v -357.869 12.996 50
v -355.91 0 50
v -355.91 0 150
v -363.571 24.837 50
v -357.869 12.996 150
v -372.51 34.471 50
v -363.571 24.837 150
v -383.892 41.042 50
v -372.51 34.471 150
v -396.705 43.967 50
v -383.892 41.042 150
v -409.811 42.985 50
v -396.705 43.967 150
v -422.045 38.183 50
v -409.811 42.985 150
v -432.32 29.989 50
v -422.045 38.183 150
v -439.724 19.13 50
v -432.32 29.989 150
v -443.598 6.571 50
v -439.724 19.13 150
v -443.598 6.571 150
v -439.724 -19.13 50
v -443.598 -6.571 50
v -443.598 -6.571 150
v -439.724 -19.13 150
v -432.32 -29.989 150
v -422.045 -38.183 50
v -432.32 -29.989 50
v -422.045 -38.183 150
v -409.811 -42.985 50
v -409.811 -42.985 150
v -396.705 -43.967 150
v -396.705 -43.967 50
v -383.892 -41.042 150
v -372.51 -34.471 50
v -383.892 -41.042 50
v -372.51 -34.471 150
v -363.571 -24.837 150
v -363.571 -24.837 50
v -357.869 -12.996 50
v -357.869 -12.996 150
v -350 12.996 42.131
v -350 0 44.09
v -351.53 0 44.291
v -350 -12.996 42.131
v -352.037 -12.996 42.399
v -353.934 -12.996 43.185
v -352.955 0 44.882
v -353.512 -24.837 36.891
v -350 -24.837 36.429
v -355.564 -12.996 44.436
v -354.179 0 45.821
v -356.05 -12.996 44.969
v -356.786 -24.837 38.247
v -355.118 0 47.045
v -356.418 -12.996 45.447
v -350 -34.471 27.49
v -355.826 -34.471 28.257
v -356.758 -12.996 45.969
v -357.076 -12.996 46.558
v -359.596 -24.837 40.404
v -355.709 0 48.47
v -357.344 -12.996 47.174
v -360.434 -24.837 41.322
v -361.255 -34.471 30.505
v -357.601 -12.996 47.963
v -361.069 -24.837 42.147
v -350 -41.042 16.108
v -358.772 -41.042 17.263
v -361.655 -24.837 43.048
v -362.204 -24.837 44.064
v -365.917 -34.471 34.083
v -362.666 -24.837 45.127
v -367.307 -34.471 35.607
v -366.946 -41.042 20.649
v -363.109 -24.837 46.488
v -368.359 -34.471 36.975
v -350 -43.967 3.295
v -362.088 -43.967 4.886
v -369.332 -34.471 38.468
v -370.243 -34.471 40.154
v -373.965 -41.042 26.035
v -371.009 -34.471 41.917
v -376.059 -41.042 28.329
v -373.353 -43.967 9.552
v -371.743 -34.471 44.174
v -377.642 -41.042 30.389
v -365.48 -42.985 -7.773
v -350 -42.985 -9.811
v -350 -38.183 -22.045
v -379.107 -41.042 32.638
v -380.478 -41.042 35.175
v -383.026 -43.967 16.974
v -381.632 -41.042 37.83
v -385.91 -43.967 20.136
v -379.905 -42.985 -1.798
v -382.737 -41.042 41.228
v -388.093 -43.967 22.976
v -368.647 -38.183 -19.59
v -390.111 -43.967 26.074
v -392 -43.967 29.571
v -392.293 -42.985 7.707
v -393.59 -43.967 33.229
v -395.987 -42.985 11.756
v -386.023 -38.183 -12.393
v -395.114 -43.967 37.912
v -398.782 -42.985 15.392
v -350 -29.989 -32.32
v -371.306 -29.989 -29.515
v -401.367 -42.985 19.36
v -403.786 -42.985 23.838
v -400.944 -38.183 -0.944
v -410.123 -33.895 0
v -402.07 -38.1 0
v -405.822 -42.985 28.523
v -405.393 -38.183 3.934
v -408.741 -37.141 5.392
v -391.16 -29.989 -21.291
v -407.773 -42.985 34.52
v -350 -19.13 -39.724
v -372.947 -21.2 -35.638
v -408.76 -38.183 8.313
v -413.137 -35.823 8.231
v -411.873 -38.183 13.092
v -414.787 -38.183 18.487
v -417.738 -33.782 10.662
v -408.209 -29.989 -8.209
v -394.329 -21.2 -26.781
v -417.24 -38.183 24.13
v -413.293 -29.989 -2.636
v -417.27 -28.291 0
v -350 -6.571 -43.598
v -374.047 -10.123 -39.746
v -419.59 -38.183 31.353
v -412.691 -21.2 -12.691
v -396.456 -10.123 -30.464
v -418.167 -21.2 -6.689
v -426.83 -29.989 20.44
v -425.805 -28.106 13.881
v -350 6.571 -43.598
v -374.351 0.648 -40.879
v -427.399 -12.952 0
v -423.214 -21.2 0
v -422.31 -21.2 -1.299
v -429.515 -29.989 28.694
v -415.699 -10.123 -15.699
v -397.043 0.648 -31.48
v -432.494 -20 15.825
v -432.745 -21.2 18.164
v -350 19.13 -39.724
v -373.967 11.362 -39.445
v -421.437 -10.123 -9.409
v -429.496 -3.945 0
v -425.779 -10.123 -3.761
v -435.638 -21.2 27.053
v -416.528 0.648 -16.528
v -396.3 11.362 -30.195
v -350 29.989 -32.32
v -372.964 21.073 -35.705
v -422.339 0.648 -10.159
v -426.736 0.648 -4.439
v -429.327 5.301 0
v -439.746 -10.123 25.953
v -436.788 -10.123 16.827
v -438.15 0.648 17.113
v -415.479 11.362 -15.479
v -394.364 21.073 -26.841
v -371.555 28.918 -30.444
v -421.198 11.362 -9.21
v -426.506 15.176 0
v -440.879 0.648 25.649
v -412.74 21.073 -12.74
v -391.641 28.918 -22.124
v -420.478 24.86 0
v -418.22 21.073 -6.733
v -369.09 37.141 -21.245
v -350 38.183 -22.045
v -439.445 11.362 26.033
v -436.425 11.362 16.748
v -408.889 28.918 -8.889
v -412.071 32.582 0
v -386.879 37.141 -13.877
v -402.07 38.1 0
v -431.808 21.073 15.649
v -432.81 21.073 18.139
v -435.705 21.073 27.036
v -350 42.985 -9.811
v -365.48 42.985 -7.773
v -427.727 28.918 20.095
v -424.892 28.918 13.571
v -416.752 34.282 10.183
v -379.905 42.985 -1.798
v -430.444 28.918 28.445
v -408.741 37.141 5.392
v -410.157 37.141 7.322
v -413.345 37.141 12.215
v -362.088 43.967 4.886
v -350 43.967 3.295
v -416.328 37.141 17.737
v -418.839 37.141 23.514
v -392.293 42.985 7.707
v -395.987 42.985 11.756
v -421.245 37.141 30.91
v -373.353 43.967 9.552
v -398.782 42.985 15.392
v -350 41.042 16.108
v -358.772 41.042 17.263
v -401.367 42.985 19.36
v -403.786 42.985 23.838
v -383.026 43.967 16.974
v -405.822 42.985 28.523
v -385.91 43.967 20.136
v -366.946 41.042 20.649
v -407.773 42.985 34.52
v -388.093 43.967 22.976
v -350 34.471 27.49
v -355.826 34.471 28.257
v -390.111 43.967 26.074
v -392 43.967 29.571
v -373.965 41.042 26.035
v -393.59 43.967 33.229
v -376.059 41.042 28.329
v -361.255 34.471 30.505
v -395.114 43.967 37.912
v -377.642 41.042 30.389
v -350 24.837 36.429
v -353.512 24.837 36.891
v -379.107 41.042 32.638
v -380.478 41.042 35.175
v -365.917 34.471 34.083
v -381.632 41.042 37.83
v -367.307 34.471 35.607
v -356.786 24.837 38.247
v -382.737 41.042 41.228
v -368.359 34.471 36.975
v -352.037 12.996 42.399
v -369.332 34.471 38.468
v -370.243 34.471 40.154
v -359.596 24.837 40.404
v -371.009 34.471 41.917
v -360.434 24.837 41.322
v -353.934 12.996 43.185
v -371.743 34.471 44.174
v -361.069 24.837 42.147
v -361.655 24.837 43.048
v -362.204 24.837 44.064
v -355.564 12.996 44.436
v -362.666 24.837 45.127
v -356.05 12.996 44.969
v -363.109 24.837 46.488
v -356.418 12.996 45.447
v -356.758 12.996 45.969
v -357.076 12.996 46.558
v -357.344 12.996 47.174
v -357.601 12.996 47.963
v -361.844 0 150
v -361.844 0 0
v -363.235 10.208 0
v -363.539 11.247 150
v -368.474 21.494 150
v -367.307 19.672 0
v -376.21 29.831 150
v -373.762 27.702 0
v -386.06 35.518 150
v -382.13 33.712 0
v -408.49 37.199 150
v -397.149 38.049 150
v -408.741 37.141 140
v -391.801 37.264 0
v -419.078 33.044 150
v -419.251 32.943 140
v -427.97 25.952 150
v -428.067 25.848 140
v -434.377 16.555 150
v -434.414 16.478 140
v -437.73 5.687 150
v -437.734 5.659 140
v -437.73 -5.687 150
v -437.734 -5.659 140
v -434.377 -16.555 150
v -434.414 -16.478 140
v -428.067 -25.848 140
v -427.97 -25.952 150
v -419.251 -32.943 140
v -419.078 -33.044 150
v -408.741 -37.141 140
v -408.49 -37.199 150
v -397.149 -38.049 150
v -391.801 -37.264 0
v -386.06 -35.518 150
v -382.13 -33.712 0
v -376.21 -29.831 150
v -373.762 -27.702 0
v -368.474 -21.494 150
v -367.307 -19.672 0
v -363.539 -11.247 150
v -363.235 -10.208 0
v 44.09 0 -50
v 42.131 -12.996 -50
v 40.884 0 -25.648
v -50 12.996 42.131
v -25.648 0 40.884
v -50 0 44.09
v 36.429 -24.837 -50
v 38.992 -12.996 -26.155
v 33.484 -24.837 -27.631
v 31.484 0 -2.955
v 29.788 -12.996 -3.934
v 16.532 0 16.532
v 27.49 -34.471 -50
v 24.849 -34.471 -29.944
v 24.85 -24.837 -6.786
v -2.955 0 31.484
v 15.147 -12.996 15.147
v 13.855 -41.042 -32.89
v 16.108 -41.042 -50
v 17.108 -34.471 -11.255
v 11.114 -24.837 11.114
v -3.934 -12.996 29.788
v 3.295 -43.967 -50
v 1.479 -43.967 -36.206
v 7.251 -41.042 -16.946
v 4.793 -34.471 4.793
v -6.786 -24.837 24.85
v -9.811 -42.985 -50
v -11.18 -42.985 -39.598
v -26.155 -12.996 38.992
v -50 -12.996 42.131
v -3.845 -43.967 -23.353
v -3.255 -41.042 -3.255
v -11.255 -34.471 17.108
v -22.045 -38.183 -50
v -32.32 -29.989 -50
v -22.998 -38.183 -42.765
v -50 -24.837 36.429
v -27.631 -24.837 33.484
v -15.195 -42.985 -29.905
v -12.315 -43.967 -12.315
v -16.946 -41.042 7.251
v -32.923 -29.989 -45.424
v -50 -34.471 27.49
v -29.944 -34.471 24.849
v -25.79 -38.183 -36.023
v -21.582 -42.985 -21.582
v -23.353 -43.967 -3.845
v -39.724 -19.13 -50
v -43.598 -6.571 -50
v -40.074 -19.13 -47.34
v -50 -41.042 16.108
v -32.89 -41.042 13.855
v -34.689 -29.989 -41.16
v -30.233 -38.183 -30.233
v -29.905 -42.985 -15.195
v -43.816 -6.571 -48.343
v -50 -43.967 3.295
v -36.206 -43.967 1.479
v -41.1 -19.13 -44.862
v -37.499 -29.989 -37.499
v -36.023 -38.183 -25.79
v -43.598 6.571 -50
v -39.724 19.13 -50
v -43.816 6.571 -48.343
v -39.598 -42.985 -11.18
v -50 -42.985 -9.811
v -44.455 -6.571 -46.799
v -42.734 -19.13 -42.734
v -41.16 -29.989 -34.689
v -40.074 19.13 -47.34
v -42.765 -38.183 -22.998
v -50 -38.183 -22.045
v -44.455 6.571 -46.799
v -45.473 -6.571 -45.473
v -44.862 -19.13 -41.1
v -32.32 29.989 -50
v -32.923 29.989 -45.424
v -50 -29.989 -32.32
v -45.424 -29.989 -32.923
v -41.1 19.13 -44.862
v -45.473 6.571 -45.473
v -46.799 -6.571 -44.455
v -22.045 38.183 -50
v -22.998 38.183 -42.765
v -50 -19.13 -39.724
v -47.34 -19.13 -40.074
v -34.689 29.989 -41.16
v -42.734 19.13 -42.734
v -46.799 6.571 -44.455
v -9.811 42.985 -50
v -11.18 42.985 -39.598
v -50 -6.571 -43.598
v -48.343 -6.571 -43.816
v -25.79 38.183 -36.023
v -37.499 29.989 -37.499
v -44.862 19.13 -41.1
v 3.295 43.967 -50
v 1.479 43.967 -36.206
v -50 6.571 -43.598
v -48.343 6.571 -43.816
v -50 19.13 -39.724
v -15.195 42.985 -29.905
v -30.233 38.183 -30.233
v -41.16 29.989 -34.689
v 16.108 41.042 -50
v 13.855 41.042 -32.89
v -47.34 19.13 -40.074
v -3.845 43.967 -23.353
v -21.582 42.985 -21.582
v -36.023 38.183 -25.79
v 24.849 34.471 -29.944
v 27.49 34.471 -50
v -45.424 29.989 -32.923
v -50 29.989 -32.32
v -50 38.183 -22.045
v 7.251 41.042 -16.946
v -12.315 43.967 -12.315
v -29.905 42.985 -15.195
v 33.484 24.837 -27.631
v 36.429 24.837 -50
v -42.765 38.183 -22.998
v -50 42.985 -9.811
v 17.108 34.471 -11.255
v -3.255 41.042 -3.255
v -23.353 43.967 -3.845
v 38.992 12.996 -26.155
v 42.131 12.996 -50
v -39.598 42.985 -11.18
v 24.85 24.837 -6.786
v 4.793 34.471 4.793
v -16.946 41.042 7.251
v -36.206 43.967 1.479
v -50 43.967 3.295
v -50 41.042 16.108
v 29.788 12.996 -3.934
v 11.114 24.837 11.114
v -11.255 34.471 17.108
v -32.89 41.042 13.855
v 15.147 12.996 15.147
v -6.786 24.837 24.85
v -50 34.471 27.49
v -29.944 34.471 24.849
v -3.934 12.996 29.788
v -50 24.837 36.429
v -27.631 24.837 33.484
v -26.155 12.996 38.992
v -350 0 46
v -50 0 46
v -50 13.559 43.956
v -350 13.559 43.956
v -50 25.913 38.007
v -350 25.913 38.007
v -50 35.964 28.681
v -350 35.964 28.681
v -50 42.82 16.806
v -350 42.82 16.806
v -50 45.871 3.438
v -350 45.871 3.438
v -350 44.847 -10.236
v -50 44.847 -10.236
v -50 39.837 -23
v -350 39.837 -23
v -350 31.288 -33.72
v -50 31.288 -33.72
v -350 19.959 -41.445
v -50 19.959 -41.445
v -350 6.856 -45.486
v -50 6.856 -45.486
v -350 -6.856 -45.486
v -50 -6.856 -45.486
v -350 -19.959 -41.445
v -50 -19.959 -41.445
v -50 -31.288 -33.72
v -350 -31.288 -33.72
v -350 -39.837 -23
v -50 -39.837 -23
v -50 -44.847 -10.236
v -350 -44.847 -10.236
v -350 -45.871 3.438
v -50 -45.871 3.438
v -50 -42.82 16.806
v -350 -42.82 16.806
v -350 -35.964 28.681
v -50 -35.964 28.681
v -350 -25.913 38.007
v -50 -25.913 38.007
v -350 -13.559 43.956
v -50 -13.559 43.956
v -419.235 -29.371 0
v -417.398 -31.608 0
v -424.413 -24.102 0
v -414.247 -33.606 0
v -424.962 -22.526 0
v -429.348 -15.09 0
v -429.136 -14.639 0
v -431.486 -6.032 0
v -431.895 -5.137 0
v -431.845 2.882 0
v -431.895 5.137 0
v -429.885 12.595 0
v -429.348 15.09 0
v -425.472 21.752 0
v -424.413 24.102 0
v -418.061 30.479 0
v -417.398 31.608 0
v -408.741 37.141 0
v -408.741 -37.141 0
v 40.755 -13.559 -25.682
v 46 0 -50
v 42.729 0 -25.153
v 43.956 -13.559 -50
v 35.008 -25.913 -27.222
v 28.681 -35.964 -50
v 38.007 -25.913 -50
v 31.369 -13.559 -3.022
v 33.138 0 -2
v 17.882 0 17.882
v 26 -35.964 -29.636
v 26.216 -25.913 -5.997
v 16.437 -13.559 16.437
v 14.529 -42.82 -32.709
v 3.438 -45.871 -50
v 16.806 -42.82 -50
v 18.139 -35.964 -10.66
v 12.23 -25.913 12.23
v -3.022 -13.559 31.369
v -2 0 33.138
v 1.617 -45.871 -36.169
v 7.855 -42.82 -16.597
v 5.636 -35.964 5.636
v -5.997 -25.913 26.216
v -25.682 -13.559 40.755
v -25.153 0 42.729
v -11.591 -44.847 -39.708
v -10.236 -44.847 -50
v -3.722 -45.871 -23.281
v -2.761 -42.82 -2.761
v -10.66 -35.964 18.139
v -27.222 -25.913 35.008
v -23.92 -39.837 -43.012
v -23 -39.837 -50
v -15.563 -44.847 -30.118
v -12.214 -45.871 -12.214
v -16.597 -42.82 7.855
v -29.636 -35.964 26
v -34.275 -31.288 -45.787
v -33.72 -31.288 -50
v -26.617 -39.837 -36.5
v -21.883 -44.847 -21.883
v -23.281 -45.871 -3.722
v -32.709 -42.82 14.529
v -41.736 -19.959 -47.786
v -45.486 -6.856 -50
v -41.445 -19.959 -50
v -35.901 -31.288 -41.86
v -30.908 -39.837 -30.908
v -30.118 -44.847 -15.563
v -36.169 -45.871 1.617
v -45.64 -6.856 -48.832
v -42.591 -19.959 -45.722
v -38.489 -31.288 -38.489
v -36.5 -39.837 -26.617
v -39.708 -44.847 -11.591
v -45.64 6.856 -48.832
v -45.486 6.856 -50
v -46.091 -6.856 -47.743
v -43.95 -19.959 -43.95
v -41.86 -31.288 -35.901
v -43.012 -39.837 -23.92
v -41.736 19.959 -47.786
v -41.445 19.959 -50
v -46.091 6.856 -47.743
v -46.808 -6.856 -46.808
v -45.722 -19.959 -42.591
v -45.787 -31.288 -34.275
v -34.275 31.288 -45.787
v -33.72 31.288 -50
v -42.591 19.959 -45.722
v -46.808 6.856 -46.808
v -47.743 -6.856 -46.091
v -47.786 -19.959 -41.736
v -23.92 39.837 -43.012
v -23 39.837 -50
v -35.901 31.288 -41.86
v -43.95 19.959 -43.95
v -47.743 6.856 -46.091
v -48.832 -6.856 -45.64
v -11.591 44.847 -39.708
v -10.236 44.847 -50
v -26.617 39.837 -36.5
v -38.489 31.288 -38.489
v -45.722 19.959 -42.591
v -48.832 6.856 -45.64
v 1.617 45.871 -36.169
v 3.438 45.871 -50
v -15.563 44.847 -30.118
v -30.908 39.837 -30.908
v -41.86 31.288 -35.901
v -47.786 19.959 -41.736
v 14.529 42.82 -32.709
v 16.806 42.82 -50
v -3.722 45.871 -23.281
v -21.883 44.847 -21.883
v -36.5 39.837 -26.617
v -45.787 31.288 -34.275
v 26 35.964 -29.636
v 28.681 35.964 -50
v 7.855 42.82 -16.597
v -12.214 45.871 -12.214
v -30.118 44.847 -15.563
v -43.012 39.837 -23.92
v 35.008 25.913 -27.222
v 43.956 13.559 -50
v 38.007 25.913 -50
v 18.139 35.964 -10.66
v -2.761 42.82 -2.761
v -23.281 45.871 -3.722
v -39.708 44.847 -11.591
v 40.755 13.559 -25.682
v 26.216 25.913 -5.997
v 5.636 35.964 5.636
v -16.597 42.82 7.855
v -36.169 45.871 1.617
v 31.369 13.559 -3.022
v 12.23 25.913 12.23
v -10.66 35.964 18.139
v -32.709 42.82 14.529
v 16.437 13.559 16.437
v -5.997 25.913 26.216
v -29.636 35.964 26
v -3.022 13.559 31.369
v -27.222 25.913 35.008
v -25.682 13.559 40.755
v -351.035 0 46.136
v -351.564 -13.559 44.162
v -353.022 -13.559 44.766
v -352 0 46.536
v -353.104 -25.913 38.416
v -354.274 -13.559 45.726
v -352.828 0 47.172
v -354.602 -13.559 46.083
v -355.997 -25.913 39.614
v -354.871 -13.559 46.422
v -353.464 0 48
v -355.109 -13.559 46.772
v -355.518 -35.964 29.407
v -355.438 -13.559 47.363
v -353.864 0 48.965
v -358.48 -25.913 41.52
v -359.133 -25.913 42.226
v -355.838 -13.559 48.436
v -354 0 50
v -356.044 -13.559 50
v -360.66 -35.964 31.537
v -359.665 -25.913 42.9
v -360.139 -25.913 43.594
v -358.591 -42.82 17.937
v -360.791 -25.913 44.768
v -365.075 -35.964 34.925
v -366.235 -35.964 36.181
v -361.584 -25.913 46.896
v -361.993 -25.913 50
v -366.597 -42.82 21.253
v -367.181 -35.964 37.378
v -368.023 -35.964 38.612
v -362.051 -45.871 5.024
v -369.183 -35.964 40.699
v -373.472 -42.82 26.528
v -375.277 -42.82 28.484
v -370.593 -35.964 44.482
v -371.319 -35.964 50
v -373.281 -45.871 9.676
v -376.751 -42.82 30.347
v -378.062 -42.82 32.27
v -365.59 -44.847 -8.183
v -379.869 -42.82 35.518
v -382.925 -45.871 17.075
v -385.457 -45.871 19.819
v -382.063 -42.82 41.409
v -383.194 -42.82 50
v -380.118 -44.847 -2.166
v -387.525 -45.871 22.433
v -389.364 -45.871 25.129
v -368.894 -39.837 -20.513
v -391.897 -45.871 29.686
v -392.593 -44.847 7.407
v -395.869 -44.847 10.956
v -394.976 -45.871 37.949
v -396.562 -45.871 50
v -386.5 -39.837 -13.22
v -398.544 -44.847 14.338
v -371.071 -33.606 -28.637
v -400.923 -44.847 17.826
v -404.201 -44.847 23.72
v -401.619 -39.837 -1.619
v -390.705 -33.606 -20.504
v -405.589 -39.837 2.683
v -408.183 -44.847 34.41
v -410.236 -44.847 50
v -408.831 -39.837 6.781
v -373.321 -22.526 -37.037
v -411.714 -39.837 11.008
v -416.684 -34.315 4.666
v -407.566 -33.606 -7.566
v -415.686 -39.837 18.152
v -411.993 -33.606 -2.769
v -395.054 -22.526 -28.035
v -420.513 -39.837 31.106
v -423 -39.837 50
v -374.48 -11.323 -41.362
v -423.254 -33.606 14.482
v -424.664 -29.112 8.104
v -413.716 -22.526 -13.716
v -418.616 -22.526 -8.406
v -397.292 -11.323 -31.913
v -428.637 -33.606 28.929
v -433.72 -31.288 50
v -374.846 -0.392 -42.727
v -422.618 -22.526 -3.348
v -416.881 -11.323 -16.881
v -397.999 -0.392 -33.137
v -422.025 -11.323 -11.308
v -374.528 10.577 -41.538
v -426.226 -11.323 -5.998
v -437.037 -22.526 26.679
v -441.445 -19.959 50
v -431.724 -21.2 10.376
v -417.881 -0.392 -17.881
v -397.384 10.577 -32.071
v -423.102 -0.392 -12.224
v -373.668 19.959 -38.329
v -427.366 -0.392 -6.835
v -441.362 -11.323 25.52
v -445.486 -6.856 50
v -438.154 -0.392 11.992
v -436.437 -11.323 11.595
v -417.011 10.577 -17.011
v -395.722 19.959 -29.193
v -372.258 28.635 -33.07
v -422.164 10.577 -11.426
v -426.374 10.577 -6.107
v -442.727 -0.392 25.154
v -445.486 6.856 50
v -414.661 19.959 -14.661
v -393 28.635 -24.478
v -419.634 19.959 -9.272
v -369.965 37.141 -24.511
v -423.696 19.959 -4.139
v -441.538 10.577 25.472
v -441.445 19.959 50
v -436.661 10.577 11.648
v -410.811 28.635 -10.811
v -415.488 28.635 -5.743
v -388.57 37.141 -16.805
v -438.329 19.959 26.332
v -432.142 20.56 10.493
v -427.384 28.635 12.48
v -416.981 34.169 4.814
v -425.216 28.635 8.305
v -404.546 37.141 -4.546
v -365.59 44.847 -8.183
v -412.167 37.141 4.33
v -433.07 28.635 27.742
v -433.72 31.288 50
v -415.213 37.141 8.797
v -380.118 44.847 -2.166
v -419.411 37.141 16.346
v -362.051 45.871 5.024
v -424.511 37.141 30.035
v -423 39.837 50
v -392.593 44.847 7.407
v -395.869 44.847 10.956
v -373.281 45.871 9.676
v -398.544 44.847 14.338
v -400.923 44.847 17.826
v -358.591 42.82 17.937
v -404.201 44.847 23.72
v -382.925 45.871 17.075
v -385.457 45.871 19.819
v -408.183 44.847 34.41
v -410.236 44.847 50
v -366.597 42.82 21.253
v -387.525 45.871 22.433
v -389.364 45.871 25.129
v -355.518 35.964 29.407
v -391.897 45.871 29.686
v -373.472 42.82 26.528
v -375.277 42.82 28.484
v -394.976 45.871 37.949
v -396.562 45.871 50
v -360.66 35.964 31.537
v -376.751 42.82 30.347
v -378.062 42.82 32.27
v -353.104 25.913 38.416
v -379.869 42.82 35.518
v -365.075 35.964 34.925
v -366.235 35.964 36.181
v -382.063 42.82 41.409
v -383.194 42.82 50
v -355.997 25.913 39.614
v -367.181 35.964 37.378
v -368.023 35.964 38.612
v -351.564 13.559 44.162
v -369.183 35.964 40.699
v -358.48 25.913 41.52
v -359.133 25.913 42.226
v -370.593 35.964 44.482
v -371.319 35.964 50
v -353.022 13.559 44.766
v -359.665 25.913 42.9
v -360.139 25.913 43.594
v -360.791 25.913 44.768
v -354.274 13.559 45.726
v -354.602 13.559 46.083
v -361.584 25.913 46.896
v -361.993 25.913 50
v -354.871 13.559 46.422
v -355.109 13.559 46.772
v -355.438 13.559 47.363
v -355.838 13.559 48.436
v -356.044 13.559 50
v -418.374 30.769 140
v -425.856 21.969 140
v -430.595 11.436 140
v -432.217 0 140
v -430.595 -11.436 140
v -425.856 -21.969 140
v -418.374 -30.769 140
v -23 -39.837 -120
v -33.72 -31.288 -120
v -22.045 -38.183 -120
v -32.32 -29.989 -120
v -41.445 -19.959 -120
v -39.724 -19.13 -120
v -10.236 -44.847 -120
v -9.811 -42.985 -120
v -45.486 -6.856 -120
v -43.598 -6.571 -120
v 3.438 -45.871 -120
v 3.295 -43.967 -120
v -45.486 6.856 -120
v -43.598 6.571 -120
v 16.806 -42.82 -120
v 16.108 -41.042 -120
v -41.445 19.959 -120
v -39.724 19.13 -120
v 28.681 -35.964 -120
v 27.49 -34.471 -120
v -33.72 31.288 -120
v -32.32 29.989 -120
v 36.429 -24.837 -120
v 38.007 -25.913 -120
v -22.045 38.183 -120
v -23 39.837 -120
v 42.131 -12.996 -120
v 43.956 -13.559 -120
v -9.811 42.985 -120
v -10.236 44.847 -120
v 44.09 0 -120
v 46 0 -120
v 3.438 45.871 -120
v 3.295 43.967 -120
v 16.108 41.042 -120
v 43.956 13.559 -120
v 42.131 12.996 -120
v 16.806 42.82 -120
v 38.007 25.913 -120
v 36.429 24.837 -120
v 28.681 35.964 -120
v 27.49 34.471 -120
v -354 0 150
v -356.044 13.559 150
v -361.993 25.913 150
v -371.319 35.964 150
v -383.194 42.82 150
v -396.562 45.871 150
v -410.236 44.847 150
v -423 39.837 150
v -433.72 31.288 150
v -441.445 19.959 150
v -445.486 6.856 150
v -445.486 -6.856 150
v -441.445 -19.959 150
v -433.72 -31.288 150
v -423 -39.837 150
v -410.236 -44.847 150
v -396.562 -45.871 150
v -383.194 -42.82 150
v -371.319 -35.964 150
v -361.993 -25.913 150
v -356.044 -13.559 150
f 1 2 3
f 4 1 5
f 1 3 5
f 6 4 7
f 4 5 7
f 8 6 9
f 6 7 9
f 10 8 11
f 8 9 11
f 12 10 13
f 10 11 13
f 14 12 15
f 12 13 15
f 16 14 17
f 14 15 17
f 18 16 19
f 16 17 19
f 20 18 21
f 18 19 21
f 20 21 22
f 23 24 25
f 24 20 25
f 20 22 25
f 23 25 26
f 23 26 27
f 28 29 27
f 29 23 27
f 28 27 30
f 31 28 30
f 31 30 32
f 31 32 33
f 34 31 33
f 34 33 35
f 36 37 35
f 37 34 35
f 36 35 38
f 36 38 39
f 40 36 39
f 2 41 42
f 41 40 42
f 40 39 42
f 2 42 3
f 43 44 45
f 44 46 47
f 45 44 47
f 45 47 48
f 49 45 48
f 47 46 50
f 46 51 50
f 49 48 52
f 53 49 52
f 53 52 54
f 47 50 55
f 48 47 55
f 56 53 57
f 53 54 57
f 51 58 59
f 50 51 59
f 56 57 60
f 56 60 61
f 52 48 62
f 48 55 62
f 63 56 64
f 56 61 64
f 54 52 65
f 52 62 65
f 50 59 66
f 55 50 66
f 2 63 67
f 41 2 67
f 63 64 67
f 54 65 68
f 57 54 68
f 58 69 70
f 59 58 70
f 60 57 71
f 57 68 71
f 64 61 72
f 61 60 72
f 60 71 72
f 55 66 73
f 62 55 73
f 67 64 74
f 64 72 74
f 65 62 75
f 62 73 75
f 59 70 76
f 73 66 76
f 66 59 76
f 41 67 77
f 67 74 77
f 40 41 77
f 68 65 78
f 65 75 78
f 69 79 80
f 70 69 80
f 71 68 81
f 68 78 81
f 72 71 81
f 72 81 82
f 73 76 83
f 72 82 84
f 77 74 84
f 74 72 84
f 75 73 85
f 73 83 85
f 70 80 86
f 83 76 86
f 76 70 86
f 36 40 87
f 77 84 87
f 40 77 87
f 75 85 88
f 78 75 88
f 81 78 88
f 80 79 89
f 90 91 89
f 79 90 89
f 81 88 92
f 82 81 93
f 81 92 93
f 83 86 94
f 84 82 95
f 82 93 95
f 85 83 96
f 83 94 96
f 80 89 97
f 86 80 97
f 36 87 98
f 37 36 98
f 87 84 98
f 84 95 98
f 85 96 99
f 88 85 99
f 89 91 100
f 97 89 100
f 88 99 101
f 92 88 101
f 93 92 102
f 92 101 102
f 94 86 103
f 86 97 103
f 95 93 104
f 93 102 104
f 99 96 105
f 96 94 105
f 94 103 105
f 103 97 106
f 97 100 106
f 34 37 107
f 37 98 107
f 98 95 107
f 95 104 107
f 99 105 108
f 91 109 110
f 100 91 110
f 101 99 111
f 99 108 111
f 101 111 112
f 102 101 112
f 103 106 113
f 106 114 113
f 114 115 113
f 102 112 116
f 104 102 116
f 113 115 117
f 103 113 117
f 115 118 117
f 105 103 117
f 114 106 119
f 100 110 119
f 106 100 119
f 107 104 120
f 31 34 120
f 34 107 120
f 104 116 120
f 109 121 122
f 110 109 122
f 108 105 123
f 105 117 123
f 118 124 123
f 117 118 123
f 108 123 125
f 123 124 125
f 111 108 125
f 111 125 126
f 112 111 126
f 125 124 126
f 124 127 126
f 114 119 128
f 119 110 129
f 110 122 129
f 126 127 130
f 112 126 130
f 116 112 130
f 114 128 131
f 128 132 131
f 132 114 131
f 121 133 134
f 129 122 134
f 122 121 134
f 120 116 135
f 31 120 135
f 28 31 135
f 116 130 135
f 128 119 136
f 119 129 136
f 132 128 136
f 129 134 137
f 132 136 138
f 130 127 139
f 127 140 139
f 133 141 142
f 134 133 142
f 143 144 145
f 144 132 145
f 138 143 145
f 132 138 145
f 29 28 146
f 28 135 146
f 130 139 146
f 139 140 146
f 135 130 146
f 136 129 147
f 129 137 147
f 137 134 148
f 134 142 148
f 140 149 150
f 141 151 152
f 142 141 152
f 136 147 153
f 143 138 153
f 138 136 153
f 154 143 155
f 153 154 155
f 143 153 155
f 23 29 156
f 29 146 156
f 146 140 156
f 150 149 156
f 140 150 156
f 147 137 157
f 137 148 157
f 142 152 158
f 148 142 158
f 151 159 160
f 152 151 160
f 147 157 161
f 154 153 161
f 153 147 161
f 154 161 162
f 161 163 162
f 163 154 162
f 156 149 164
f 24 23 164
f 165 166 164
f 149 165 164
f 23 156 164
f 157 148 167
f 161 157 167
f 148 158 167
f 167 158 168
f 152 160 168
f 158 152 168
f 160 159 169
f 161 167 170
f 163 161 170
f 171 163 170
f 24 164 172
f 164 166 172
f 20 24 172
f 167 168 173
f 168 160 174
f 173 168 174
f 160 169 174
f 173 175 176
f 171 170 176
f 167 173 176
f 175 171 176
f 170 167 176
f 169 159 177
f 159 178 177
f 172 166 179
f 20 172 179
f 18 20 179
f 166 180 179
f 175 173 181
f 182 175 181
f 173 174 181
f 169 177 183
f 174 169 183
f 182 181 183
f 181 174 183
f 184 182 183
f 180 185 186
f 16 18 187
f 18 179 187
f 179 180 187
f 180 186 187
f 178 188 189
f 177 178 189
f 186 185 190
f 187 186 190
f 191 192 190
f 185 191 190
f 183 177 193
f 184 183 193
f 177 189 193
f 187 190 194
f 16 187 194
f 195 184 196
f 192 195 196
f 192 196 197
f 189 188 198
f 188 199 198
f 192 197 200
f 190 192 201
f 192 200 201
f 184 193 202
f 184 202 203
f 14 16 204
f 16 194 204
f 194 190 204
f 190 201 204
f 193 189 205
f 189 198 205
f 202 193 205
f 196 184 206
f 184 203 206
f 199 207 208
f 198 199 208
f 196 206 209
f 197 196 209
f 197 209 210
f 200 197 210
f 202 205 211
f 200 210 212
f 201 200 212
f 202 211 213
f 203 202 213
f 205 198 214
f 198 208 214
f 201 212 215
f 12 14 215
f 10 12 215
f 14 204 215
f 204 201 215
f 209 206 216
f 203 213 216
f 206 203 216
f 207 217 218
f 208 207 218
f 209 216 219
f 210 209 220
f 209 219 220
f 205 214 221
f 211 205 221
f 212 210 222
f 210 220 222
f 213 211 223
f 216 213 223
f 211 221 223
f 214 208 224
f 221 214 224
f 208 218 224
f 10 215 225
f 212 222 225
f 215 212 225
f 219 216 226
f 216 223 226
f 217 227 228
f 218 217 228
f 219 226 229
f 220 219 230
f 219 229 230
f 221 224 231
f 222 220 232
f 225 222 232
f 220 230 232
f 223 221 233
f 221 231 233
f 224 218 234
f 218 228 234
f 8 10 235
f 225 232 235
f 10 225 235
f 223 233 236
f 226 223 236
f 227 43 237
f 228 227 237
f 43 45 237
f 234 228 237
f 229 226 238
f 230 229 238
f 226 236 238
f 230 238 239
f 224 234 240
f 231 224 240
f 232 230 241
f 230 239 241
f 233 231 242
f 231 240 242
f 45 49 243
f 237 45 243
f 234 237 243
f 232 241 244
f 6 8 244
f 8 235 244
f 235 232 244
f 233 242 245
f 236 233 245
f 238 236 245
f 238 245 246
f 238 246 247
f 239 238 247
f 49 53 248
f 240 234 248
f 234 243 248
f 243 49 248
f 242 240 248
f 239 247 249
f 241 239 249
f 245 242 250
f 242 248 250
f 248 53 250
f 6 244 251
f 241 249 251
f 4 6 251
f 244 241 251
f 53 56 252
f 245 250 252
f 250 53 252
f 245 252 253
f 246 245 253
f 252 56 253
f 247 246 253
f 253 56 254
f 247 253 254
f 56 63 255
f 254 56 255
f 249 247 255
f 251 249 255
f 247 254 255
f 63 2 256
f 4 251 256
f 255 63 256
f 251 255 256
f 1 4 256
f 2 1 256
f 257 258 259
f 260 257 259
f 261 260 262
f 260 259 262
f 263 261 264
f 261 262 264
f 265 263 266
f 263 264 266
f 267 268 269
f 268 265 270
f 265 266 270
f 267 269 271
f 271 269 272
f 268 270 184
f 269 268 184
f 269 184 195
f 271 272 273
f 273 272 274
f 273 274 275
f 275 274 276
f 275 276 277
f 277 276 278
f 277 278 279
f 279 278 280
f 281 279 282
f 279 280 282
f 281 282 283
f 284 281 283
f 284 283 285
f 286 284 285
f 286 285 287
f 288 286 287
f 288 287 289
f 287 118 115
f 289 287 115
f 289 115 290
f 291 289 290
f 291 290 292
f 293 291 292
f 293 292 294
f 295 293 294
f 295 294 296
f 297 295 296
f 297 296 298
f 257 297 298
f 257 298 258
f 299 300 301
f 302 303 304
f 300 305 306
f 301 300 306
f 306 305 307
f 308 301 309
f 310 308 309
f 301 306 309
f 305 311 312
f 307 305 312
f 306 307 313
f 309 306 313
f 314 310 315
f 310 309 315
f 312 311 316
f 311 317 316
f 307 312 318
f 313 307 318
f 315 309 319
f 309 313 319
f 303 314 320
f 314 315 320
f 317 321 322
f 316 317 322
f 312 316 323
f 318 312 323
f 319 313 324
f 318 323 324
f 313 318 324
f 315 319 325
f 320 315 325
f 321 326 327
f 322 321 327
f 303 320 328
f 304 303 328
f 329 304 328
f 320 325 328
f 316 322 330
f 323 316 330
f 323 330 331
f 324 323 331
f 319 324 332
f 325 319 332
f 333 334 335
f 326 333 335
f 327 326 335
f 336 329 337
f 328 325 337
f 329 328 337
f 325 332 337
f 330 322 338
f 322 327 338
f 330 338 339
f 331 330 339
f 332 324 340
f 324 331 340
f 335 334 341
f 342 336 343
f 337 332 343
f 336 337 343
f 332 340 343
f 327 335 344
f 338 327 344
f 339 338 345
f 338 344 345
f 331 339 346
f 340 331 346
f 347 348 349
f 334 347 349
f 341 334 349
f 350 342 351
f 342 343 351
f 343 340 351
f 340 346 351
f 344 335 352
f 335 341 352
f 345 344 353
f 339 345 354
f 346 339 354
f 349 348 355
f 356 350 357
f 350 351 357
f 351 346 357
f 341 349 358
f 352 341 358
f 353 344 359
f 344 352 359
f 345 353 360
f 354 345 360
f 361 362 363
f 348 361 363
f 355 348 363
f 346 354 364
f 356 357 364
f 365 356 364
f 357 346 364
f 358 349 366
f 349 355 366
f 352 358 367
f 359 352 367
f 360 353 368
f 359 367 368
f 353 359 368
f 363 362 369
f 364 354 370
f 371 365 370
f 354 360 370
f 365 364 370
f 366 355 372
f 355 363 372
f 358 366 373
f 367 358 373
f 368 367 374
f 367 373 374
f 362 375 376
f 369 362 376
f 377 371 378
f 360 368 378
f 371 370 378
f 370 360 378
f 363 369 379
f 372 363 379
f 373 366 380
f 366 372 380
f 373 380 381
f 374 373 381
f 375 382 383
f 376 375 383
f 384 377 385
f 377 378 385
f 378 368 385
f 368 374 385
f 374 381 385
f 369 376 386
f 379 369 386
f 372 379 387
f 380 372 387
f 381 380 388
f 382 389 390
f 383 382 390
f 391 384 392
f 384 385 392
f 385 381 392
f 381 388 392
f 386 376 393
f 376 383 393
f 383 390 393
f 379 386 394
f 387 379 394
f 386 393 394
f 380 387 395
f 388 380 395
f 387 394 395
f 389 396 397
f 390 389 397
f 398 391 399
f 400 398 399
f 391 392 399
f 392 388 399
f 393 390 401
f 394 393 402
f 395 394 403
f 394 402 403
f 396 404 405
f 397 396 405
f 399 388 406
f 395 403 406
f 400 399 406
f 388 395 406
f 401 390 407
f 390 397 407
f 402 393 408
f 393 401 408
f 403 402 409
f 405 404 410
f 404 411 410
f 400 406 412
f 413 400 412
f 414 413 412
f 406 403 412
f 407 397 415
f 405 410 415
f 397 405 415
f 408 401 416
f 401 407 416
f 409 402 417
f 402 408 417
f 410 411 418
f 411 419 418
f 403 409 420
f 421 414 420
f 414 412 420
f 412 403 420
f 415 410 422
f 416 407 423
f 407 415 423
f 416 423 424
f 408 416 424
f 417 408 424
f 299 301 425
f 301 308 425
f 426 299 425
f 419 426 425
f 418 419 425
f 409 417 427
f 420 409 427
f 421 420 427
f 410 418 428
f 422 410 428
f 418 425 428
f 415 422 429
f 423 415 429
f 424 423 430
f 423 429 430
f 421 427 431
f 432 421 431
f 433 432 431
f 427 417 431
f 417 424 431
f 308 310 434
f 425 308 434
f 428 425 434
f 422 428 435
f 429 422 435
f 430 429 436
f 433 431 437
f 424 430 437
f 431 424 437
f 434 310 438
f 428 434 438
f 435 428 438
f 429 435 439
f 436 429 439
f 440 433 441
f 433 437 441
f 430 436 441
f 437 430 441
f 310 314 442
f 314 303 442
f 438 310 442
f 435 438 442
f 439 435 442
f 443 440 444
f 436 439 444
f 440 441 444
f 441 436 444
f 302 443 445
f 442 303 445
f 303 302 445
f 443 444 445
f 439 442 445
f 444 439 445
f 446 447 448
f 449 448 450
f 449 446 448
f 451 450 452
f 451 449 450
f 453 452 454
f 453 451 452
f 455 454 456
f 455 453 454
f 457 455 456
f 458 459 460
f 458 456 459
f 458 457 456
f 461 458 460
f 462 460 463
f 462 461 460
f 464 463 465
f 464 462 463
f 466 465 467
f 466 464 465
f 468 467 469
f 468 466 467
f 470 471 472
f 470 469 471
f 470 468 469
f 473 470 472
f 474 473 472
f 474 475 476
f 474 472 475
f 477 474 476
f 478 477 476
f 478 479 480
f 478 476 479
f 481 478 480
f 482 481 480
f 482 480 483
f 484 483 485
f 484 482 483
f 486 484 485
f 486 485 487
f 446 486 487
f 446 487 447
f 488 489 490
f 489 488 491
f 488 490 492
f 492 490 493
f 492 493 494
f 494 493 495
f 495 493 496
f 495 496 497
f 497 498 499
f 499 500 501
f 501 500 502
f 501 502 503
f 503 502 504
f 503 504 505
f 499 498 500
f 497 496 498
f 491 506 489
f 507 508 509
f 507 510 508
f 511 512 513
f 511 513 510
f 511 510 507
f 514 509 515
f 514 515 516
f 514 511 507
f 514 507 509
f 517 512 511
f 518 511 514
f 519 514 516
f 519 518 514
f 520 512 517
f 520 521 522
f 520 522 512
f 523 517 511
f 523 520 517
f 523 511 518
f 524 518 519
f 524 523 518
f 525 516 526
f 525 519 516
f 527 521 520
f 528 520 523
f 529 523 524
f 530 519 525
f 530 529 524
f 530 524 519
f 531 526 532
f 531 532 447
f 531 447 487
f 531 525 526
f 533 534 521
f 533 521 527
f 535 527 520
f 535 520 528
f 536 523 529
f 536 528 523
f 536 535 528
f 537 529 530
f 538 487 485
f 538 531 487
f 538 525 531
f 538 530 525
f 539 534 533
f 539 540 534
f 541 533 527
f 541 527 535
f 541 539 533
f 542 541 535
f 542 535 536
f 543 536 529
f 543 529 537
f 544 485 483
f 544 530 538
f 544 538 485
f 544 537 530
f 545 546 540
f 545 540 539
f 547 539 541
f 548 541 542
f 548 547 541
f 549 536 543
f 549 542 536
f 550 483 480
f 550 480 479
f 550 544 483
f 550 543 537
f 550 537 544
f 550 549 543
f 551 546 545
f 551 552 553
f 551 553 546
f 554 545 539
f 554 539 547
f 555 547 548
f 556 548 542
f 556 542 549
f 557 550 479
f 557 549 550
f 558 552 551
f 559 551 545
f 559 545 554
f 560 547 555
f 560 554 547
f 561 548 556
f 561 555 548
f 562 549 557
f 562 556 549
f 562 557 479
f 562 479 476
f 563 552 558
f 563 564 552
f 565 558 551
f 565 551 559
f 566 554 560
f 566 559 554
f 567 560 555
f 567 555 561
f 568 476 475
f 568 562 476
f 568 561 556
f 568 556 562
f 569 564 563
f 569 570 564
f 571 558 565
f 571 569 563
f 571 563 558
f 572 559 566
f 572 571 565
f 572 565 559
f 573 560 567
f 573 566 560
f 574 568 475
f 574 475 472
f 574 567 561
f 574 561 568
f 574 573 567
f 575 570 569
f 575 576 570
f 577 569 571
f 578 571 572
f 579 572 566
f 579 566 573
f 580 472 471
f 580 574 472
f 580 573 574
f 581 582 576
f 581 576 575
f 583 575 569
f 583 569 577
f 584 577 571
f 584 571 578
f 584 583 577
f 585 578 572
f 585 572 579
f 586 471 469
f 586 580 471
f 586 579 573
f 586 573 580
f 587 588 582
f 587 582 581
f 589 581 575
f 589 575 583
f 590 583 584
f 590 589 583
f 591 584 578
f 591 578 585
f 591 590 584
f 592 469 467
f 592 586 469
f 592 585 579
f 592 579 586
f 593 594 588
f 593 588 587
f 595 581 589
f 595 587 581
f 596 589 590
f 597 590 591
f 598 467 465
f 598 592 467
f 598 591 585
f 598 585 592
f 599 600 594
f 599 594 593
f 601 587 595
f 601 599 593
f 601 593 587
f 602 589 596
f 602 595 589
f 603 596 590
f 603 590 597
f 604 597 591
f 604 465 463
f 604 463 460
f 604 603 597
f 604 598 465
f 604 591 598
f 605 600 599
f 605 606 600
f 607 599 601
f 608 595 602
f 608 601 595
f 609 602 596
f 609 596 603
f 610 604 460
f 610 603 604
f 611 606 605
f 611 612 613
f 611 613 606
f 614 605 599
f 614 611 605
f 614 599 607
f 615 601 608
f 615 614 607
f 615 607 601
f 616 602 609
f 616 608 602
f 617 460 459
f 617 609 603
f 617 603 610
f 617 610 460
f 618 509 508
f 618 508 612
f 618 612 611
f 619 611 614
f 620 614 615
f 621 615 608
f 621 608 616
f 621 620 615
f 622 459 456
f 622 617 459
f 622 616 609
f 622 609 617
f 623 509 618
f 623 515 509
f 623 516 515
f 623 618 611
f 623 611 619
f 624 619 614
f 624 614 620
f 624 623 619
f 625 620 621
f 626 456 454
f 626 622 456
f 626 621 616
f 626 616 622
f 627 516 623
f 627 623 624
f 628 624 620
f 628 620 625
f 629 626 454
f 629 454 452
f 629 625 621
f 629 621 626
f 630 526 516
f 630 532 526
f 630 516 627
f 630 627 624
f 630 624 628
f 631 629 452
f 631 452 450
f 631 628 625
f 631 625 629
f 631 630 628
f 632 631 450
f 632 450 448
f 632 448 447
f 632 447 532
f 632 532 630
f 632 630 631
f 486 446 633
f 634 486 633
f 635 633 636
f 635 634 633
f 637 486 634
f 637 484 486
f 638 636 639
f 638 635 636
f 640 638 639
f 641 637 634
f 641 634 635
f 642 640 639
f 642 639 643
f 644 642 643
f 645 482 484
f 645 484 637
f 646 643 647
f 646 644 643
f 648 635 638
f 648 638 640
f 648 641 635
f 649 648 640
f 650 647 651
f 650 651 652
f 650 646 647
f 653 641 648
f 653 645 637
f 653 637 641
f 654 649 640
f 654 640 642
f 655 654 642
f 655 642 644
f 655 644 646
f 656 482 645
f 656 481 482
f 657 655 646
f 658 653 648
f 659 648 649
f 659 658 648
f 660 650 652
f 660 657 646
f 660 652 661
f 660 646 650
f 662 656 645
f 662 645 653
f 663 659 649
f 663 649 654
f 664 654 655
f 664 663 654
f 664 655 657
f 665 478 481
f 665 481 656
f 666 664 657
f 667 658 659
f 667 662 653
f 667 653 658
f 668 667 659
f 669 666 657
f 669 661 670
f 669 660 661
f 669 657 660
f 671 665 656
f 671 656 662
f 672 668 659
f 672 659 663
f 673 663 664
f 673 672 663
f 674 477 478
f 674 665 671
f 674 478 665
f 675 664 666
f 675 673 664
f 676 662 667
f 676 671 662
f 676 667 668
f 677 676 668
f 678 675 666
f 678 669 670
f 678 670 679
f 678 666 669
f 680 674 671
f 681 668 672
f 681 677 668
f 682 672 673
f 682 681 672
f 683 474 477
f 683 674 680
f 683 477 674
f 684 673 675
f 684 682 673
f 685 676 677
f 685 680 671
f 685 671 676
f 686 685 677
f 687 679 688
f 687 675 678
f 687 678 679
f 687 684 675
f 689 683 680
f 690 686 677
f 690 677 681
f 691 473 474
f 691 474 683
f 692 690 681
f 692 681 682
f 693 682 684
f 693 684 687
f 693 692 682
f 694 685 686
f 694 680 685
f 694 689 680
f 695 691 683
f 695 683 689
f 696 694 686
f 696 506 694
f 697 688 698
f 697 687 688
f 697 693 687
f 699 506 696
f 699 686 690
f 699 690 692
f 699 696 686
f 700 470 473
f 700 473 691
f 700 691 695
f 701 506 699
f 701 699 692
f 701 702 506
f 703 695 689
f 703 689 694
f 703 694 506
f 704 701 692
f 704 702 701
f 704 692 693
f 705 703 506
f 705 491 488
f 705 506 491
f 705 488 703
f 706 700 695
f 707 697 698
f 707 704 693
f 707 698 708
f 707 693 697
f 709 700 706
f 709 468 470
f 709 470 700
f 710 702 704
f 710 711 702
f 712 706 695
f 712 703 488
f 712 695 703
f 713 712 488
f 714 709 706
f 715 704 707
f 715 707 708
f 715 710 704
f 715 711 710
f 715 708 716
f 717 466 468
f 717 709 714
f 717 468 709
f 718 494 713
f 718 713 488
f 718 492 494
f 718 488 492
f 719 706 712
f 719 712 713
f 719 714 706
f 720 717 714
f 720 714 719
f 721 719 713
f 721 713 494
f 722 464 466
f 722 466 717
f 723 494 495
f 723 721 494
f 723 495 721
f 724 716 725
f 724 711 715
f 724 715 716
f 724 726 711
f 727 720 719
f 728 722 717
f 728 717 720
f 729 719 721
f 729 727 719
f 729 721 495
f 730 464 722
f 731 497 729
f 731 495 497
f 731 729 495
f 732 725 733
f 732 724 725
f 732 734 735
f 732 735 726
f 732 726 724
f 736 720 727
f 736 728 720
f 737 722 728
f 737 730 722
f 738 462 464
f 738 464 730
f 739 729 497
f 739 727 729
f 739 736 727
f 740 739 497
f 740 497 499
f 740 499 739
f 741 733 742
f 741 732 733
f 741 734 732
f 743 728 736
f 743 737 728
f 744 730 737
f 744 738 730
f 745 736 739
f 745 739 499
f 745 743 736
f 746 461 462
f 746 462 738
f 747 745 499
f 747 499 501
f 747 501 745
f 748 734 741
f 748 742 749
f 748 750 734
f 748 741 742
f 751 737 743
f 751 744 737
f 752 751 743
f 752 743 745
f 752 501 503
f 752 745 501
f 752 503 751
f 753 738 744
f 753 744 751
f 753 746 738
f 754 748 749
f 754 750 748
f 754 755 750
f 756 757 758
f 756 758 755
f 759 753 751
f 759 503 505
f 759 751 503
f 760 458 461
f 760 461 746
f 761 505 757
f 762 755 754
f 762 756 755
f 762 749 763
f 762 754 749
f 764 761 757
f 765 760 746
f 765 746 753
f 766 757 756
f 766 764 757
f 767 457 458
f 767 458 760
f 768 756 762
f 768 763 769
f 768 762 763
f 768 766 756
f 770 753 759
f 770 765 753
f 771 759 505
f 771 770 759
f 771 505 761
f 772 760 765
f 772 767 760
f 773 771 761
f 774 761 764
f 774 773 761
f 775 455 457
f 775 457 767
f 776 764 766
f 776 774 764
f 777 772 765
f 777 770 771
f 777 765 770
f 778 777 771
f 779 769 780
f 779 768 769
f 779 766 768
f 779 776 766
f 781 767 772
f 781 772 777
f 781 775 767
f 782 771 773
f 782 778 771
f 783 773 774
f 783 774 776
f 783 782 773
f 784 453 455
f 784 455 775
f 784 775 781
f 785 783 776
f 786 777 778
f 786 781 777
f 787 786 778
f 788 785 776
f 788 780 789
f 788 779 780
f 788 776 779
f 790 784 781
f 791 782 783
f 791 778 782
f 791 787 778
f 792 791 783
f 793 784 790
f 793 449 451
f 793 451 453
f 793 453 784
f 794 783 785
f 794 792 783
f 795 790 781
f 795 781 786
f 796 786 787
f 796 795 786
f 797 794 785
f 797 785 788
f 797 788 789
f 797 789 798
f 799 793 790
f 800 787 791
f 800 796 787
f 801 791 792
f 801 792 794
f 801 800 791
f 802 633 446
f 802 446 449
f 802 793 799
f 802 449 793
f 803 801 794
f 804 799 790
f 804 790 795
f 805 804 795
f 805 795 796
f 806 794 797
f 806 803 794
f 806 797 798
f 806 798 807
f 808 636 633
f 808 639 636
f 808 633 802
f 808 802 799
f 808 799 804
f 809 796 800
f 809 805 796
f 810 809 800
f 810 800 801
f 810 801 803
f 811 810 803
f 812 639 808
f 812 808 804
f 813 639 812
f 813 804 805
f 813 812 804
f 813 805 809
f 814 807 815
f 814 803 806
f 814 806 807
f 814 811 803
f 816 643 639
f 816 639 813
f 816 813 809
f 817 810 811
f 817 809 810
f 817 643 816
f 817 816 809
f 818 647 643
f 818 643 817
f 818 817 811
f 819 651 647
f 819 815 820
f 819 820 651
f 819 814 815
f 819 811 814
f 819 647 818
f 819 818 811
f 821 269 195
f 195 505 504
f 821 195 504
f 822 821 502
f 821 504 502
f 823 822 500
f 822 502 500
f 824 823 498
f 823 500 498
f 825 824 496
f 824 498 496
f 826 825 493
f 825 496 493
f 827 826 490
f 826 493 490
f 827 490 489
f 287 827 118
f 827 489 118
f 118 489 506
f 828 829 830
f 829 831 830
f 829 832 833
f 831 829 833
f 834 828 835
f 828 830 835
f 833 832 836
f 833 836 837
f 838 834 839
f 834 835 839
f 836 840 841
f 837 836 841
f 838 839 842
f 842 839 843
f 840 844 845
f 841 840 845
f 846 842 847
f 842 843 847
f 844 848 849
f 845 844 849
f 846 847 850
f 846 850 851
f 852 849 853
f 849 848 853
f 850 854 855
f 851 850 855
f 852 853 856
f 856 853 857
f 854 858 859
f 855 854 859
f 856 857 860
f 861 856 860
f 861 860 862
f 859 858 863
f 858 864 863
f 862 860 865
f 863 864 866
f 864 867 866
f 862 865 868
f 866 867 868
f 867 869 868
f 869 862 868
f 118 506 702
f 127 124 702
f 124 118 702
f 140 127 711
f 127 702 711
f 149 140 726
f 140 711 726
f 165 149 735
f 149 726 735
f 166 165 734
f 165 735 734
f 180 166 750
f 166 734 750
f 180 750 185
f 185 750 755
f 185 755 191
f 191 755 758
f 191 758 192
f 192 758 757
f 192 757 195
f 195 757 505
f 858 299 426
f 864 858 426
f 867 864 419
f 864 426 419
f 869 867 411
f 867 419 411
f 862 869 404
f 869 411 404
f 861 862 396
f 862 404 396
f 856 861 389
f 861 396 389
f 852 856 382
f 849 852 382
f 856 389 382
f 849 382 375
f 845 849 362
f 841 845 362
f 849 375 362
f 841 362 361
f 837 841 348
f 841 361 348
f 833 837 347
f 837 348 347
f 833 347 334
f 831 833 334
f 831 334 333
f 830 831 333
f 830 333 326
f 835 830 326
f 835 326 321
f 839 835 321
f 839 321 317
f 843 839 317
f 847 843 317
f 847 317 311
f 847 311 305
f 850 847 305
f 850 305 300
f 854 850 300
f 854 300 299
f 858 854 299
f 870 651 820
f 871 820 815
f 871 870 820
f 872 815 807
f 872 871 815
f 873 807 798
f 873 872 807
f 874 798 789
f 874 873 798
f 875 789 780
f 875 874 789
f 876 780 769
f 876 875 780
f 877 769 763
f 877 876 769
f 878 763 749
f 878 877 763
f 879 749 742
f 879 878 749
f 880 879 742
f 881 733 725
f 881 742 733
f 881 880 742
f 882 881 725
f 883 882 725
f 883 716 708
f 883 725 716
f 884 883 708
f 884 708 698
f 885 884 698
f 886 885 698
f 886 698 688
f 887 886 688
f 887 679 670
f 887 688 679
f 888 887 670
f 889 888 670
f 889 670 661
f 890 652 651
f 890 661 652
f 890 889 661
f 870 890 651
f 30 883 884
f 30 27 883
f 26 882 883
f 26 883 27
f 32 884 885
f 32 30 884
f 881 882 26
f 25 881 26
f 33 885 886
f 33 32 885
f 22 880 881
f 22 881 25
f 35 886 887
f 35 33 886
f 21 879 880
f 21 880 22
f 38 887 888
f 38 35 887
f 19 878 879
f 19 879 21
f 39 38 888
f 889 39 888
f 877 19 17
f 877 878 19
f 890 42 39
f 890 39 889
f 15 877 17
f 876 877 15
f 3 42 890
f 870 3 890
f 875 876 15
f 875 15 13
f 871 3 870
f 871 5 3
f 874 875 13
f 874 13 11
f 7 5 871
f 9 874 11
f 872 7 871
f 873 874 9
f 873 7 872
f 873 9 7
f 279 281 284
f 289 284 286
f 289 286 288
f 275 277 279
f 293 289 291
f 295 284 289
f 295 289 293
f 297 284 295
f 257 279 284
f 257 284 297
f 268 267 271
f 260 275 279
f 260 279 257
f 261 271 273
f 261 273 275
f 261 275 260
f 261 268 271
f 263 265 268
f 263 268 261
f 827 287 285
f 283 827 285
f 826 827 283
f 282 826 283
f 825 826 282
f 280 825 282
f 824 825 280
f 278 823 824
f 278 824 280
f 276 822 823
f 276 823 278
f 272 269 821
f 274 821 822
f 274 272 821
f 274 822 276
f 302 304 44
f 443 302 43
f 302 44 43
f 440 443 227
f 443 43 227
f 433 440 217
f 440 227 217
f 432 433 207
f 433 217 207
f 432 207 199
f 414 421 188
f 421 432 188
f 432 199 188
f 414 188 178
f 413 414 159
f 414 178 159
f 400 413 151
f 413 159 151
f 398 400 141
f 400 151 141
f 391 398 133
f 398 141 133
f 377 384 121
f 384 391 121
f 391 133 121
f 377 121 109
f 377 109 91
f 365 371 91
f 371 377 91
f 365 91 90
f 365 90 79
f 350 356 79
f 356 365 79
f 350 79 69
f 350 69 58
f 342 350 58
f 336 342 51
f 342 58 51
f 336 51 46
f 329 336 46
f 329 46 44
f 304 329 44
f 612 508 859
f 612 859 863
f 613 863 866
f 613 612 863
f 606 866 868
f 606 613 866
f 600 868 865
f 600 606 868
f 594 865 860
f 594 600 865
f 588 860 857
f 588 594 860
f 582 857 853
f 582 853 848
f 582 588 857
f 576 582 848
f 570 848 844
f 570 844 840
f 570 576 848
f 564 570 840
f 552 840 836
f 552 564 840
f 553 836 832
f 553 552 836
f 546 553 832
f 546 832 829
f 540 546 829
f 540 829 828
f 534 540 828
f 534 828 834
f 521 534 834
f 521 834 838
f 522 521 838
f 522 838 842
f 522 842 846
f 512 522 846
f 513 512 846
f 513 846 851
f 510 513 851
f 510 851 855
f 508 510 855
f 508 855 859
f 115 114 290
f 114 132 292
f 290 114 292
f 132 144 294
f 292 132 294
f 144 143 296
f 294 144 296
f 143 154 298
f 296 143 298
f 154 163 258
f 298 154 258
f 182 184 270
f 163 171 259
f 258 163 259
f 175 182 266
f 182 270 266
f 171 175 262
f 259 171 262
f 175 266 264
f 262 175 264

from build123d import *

# Parameters (mm, degrees)
SKETCH4_R           = 38.155726857
BOSS_EXTRUDE1_DEPTH = 150
SKETCH5_R           = 46
SKETCH5_R_2         = 44.09
CUT_EXTRUDE1_DEPTH  = 140


with BuildPart() as part:
    # Sketch4 → Boss-Extrude1 (new body)
    with BuildSketch(Plane.XY):
        with Locations((-400, 0)):
            Circle(SKETCH4_R)
    extrude(amount=BOSS_EXTRUDE1_DEPTH)

    # Sweep2: sweep along a path in Sketch2
    with BuildLine(Plane(origin=(0, 0, 0), x_dir=(1, 0, 0), z_dir=(0, 1, 0))) as sweep2_path:
        Line((0, 120), (0, 50))
        ThreePointArc((0, 50), (-14.644660941, 14.644660941), (-50, 0))
        Line((-50, 0), (-350, 0))
        ThreePointArc((-350, 0), (-385.355339059, -14.644660941), (-400, -50))
        Line((-400, -50), (-400, -150))
    # Sketch5 → Sweep2 (sweep)
    with BuildSketch(Plane.XY.offset(150)):
        with Locations((-400, 0)):
            Circle(SKETCH5_R)
        with Locations((-400, 0)):
            Circle(SKETCH5_R_2, mode=Mode.SUBTRACT)
    sweep(path=sweep2_path.line)

    # Sketch6 → Cut-Extrude1 (cut)
    with BuildSketch(Plane(origin=(0, 0, 0), x_dir=(-1, 0, 0), z_dir=(0, 0, -1))):
        with BuildLine():
            ThreePointArc((408.740673251, -37.141084033), (438.155726857, 0), (408.740673251, 37.141084033))
            ThreePointArc((408.740673251, 37.141084033), (432.21706088, 0), (408.740673251, -37.141084033))
        make_face()
    extrude(amount=-CUT_EXTRUDE1_DEPTH, mode=Mode.SUBTRACT)


solid = part.part
